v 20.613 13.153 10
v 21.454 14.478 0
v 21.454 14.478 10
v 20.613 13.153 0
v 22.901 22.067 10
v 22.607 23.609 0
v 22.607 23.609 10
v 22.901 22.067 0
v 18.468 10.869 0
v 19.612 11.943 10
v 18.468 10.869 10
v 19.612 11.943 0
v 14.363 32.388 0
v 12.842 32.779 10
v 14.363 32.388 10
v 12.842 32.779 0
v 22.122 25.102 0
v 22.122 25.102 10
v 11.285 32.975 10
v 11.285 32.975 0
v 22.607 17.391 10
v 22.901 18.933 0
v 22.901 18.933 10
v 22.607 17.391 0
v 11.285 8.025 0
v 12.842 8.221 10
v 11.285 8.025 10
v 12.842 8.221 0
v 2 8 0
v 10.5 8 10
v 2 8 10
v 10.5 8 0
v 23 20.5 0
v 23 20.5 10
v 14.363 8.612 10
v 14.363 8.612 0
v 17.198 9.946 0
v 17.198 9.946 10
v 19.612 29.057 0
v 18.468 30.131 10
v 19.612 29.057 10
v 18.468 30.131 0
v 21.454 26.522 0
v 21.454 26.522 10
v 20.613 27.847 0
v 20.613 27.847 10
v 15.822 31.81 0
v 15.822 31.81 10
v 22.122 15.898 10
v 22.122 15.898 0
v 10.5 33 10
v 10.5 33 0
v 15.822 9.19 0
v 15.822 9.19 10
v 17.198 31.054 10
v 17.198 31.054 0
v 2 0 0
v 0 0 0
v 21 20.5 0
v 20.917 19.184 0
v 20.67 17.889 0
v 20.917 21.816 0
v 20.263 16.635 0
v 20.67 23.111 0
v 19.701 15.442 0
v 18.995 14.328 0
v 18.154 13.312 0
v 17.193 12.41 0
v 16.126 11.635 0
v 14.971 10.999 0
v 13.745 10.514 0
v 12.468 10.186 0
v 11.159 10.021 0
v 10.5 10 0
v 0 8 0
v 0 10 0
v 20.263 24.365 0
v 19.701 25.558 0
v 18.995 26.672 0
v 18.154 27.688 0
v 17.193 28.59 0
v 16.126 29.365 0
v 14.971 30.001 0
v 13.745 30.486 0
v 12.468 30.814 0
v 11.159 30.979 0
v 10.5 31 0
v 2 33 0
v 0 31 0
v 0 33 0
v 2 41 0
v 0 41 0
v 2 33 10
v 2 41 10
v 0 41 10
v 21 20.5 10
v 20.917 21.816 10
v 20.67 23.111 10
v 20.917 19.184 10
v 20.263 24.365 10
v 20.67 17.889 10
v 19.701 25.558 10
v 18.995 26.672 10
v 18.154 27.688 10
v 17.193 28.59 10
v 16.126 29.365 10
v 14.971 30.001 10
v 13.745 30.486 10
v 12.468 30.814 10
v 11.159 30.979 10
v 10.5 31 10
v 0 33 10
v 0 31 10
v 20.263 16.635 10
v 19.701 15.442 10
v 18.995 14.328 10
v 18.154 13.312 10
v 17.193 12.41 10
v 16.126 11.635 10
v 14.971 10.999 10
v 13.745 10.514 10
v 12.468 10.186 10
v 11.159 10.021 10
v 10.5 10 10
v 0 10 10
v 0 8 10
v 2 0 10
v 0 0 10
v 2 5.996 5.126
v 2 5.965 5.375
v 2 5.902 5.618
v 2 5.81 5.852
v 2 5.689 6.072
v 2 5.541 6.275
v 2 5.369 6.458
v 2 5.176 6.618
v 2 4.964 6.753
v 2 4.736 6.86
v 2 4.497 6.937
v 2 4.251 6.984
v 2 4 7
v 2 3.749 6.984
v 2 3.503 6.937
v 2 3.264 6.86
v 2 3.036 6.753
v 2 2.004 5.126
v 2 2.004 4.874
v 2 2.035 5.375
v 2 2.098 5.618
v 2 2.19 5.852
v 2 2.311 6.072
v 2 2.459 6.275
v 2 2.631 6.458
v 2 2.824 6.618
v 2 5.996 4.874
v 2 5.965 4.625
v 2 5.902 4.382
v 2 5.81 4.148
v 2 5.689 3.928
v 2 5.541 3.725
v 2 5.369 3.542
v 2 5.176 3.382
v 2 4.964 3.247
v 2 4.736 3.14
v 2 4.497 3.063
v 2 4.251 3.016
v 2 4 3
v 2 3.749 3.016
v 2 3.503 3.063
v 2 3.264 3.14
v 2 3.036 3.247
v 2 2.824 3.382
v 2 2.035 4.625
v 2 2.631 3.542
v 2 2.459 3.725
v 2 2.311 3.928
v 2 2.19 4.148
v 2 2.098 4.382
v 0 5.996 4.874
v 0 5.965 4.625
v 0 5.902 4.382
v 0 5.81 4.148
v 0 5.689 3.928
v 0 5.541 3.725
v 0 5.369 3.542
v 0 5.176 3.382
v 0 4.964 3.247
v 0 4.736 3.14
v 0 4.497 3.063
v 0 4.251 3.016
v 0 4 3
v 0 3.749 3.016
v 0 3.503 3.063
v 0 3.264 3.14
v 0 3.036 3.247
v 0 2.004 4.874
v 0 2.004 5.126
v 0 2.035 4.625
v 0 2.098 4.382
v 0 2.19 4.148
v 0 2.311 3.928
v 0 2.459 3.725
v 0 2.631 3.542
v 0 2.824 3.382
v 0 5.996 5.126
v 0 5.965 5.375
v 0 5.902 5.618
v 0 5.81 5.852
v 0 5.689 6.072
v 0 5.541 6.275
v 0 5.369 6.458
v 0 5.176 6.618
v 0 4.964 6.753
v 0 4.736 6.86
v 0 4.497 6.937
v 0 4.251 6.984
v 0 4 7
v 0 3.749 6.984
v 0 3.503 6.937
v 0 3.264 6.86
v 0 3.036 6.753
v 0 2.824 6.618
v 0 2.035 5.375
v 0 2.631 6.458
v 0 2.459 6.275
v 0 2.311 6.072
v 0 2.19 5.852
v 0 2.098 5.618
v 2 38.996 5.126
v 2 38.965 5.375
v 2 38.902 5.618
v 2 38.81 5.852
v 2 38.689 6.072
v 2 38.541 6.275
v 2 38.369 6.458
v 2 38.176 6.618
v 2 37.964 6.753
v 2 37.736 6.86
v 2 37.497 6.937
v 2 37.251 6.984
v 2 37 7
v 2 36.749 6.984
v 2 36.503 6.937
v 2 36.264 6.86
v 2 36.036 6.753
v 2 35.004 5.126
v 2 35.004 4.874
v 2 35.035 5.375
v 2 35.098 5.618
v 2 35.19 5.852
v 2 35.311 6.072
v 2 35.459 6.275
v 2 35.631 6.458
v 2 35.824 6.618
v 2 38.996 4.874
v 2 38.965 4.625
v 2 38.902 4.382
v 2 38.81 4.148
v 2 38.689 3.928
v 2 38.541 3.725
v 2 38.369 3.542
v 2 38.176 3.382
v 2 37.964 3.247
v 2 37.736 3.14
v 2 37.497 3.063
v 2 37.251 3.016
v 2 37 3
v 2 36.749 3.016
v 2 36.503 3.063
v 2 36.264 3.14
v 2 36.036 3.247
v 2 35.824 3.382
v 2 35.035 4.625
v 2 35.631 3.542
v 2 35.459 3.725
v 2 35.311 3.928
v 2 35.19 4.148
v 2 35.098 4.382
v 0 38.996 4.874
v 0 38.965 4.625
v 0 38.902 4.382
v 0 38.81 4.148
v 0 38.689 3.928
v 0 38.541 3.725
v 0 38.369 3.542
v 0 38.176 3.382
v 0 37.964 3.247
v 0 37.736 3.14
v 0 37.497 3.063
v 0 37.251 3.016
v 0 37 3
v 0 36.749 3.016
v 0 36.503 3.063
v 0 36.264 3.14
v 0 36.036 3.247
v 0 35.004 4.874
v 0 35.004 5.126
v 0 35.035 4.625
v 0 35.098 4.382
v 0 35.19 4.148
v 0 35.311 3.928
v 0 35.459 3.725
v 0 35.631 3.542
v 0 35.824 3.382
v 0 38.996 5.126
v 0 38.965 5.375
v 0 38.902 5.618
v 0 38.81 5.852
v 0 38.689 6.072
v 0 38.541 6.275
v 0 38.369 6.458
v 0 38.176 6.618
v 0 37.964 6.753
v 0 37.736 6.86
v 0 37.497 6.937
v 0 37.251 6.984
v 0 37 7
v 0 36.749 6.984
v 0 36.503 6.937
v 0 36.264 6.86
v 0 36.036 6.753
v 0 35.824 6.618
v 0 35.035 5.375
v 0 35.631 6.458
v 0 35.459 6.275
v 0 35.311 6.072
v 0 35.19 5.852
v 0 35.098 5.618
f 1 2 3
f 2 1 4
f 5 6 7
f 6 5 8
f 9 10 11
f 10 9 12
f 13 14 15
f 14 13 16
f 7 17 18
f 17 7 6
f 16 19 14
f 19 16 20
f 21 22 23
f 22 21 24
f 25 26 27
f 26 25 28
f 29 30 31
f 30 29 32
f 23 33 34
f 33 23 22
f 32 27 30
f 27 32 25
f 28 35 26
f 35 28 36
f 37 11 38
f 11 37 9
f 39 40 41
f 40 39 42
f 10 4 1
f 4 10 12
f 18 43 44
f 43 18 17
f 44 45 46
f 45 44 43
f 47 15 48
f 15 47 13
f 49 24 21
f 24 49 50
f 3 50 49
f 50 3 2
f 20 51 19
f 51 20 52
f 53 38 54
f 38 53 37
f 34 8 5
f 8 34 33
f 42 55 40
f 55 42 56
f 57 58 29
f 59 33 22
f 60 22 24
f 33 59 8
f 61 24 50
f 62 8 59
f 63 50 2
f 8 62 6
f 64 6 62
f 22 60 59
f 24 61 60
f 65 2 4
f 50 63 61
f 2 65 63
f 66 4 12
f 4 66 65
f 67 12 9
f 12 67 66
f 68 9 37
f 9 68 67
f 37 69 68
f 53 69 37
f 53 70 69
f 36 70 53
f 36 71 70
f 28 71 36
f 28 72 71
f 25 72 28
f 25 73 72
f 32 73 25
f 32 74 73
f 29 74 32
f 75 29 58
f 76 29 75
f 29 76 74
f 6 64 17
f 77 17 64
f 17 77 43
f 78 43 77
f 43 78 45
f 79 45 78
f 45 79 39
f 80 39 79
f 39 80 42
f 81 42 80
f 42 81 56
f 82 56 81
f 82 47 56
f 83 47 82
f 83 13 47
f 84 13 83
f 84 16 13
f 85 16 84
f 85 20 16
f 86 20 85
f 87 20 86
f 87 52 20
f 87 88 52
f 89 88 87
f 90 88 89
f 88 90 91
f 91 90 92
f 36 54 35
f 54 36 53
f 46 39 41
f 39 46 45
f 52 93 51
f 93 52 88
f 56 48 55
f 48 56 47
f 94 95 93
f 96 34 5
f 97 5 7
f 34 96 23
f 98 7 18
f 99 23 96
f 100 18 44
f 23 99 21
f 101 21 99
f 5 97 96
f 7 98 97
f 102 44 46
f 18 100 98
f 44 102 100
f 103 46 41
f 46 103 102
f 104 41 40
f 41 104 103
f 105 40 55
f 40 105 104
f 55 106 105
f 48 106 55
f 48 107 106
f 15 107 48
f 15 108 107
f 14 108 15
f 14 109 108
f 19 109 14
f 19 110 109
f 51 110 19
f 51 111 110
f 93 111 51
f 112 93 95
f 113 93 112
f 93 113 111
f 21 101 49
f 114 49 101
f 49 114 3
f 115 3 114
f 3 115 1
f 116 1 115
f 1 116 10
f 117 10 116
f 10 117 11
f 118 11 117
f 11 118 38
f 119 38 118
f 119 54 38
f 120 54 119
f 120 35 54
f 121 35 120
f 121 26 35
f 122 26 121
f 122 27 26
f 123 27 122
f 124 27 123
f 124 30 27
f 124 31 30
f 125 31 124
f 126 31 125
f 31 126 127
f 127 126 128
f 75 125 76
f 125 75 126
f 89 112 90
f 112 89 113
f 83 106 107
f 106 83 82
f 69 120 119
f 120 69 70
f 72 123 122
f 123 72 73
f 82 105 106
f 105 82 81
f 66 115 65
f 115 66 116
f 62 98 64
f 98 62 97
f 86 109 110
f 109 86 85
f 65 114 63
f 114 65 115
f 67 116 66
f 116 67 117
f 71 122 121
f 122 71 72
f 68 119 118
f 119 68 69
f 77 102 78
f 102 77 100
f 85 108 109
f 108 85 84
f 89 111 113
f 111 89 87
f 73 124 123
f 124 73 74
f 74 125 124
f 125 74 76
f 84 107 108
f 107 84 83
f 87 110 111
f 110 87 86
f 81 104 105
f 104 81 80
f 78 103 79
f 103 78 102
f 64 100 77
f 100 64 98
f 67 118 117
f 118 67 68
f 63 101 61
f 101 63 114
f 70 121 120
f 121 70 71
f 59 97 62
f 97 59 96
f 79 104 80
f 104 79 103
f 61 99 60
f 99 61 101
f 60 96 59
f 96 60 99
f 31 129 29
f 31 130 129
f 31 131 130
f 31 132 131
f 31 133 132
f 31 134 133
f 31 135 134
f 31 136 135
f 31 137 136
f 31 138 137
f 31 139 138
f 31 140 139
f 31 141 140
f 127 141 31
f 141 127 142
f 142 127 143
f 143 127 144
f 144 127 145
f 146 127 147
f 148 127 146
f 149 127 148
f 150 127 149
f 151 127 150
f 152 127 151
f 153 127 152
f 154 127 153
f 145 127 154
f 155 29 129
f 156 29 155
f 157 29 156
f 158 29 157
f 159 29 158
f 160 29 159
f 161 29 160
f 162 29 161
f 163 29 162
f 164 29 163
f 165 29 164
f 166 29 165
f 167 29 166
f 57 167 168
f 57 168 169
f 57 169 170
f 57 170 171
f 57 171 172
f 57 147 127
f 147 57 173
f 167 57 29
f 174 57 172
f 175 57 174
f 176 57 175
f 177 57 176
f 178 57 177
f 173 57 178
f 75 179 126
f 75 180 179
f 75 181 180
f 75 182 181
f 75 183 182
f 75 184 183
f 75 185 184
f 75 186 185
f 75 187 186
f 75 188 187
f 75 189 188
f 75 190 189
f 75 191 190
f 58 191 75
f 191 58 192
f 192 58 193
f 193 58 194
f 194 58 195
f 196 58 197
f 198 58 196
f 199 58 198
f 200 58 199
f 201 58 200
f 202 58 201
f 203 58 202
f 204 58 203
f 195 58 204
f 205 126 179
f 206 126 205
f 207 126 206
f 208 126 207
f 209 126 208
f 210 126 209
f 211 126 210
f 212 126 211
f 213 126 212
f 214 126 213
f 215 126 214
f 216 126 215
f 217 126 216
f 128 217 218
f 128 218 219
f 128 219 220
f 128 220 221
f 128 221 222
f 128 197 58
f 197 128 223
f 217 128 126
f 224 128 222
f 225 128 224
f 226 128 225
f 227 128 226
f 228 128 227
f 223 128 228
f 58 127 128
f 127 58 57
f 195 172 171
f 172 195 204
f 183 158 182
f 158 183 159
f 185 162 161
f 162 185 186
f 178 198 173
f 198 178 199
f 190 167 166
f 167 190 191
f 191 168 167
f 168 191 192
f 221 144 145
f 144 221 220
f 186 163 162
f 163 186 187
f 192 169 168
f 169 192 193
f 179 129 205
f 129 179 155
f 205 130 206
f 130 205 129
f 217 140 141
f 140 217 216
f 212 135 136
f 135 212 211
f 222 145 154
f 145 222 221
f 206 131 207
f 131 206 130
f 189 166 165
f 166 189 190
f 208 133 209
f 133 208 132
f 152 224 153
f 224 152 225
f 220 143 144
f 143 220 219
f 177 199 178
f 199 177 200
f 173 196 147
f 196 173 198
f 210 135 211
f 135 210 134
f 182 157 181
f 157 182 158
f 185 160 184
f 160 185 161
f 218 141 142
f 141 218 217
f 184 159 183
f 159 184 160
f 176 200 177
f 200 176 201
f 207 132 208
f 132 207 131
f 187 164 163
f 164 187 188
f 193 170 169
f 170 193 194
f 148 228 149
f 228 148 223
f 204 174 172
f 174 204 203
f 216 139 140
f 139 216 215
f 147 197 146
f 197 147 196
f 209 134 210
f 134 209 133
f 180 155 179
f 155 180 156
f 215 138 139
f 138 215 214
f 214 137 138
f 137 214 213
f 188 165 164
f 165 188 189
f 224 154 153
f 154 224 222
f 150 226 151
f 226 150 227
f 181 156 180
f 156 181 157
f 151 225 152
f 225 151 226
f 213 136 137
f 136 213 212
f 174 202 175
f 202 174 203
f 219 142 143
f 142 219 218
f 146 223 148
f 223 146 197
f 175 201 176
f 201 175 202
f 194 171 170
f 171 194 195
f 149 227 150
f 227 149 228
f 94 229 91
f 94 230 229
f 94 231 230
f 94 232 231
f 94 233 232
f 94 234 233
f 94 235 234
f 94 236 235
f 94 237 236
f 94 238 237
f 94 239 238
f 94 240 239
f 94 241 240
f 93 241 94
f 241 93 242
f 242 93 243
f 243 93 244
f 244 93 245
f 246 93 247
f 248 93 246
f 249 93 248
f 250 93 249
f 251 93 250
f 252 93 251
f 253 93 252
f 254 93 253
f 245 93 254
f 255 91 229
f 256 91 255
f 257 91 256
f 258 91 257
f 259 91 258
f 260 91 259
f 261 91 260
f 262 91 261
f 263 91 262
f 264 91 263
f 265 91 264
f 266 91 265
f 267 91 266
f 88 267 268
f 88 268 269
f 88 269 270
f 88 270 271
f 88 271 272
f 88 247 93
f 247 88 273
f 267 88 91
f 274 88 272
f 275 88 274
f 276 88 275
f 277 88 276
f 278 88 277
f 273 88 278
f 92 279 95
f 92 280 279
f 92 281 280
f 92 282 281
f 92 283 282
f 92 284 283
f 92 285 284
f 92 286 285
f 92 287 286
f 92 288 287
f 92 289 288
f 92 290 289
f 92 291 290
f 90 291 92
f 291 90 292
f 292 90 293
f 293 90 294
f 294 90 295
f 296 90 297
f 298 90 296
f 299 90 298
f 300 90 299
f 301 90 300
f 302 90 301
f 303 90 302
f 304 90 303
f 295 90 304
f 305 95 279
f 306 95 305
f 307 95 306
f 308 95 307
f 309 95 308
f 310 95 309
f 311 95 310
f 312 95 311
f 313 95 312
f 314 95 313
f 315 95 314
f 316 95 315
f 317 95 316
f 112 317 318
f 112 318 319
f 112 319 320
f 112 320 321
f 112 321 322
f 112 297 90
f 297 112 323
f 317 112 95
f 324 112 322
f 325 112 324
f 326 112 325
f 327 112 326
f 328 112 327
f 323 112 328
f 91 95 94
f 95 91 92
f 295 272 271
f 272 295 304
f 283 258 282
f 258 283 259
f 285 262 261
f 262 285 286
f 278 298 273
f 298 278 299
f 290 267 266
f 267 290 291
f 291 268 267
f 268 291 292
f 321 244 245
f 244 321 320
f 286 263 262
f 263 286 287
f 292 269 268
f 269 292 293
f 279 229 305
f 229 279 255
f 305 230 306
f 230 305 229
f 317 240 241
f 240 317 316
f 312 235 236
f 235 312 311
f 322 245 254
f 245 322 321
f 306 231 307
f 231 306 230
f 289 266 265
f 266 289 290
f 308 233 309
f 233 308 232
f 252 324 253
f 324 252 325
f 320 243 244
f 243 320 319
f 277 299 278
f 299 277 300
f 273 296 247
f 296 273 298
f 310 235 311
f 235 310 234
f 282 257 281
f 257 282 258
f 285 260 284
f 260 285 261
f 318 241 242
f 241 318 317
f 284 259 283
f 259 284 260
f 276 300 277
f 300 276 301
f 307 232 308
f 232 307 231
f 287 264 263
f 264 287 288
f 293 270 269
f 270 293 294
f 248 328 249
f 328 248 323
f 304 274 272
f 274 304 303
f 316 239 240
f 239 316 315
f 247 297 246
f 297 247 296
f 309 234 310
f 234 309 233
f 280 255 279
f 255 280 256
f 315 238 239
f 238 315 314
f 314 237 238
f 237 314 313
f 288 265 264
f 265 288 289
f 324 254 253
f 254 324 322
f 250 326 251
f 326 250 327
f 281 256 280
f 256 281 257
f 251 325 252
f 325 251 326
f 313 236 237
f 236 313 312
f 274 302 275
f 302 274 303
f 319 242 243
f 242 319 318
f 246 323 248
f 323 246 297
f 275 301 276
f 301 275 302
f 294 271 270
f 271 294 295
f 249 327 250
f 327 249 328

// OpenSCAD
diameter=21;
thickness=2;
width=10;
screwTab=8;
screwHole=4;
$fn=50;


difference(){
    translate([diameter/2,diameter/2+thickness+screwTab,0])cylinderBlock(diameter+thickness*2,width);
    translate([diameter/2, diameter/2+thickness+screwTab,0])cylinderBlock(d=diameter, h=width);
    translate([-thickness,screwTab,0])cube([thickness, diameter+thickness*2, width]);
}
screwTab(screwTab, width, thickness, screwHole);
translate([0,screwTab+diameter+thickness*2,0])screwTab(screwTab, width, thickness, screwHole);

module cylinderBlock(d, h){
    hull(){
        cylinder(d=d, h=h);
        translate([-d/2,-d/2,0])cube([d/2,d,h]);
    }
}

module screwTab(w,h,t,d){
    difference(){
        cube([t, w, h]);
        translate([0,w/2,h/2])rotate([0,90,0])cylinder(d=d,h=t*2);
    }
}
